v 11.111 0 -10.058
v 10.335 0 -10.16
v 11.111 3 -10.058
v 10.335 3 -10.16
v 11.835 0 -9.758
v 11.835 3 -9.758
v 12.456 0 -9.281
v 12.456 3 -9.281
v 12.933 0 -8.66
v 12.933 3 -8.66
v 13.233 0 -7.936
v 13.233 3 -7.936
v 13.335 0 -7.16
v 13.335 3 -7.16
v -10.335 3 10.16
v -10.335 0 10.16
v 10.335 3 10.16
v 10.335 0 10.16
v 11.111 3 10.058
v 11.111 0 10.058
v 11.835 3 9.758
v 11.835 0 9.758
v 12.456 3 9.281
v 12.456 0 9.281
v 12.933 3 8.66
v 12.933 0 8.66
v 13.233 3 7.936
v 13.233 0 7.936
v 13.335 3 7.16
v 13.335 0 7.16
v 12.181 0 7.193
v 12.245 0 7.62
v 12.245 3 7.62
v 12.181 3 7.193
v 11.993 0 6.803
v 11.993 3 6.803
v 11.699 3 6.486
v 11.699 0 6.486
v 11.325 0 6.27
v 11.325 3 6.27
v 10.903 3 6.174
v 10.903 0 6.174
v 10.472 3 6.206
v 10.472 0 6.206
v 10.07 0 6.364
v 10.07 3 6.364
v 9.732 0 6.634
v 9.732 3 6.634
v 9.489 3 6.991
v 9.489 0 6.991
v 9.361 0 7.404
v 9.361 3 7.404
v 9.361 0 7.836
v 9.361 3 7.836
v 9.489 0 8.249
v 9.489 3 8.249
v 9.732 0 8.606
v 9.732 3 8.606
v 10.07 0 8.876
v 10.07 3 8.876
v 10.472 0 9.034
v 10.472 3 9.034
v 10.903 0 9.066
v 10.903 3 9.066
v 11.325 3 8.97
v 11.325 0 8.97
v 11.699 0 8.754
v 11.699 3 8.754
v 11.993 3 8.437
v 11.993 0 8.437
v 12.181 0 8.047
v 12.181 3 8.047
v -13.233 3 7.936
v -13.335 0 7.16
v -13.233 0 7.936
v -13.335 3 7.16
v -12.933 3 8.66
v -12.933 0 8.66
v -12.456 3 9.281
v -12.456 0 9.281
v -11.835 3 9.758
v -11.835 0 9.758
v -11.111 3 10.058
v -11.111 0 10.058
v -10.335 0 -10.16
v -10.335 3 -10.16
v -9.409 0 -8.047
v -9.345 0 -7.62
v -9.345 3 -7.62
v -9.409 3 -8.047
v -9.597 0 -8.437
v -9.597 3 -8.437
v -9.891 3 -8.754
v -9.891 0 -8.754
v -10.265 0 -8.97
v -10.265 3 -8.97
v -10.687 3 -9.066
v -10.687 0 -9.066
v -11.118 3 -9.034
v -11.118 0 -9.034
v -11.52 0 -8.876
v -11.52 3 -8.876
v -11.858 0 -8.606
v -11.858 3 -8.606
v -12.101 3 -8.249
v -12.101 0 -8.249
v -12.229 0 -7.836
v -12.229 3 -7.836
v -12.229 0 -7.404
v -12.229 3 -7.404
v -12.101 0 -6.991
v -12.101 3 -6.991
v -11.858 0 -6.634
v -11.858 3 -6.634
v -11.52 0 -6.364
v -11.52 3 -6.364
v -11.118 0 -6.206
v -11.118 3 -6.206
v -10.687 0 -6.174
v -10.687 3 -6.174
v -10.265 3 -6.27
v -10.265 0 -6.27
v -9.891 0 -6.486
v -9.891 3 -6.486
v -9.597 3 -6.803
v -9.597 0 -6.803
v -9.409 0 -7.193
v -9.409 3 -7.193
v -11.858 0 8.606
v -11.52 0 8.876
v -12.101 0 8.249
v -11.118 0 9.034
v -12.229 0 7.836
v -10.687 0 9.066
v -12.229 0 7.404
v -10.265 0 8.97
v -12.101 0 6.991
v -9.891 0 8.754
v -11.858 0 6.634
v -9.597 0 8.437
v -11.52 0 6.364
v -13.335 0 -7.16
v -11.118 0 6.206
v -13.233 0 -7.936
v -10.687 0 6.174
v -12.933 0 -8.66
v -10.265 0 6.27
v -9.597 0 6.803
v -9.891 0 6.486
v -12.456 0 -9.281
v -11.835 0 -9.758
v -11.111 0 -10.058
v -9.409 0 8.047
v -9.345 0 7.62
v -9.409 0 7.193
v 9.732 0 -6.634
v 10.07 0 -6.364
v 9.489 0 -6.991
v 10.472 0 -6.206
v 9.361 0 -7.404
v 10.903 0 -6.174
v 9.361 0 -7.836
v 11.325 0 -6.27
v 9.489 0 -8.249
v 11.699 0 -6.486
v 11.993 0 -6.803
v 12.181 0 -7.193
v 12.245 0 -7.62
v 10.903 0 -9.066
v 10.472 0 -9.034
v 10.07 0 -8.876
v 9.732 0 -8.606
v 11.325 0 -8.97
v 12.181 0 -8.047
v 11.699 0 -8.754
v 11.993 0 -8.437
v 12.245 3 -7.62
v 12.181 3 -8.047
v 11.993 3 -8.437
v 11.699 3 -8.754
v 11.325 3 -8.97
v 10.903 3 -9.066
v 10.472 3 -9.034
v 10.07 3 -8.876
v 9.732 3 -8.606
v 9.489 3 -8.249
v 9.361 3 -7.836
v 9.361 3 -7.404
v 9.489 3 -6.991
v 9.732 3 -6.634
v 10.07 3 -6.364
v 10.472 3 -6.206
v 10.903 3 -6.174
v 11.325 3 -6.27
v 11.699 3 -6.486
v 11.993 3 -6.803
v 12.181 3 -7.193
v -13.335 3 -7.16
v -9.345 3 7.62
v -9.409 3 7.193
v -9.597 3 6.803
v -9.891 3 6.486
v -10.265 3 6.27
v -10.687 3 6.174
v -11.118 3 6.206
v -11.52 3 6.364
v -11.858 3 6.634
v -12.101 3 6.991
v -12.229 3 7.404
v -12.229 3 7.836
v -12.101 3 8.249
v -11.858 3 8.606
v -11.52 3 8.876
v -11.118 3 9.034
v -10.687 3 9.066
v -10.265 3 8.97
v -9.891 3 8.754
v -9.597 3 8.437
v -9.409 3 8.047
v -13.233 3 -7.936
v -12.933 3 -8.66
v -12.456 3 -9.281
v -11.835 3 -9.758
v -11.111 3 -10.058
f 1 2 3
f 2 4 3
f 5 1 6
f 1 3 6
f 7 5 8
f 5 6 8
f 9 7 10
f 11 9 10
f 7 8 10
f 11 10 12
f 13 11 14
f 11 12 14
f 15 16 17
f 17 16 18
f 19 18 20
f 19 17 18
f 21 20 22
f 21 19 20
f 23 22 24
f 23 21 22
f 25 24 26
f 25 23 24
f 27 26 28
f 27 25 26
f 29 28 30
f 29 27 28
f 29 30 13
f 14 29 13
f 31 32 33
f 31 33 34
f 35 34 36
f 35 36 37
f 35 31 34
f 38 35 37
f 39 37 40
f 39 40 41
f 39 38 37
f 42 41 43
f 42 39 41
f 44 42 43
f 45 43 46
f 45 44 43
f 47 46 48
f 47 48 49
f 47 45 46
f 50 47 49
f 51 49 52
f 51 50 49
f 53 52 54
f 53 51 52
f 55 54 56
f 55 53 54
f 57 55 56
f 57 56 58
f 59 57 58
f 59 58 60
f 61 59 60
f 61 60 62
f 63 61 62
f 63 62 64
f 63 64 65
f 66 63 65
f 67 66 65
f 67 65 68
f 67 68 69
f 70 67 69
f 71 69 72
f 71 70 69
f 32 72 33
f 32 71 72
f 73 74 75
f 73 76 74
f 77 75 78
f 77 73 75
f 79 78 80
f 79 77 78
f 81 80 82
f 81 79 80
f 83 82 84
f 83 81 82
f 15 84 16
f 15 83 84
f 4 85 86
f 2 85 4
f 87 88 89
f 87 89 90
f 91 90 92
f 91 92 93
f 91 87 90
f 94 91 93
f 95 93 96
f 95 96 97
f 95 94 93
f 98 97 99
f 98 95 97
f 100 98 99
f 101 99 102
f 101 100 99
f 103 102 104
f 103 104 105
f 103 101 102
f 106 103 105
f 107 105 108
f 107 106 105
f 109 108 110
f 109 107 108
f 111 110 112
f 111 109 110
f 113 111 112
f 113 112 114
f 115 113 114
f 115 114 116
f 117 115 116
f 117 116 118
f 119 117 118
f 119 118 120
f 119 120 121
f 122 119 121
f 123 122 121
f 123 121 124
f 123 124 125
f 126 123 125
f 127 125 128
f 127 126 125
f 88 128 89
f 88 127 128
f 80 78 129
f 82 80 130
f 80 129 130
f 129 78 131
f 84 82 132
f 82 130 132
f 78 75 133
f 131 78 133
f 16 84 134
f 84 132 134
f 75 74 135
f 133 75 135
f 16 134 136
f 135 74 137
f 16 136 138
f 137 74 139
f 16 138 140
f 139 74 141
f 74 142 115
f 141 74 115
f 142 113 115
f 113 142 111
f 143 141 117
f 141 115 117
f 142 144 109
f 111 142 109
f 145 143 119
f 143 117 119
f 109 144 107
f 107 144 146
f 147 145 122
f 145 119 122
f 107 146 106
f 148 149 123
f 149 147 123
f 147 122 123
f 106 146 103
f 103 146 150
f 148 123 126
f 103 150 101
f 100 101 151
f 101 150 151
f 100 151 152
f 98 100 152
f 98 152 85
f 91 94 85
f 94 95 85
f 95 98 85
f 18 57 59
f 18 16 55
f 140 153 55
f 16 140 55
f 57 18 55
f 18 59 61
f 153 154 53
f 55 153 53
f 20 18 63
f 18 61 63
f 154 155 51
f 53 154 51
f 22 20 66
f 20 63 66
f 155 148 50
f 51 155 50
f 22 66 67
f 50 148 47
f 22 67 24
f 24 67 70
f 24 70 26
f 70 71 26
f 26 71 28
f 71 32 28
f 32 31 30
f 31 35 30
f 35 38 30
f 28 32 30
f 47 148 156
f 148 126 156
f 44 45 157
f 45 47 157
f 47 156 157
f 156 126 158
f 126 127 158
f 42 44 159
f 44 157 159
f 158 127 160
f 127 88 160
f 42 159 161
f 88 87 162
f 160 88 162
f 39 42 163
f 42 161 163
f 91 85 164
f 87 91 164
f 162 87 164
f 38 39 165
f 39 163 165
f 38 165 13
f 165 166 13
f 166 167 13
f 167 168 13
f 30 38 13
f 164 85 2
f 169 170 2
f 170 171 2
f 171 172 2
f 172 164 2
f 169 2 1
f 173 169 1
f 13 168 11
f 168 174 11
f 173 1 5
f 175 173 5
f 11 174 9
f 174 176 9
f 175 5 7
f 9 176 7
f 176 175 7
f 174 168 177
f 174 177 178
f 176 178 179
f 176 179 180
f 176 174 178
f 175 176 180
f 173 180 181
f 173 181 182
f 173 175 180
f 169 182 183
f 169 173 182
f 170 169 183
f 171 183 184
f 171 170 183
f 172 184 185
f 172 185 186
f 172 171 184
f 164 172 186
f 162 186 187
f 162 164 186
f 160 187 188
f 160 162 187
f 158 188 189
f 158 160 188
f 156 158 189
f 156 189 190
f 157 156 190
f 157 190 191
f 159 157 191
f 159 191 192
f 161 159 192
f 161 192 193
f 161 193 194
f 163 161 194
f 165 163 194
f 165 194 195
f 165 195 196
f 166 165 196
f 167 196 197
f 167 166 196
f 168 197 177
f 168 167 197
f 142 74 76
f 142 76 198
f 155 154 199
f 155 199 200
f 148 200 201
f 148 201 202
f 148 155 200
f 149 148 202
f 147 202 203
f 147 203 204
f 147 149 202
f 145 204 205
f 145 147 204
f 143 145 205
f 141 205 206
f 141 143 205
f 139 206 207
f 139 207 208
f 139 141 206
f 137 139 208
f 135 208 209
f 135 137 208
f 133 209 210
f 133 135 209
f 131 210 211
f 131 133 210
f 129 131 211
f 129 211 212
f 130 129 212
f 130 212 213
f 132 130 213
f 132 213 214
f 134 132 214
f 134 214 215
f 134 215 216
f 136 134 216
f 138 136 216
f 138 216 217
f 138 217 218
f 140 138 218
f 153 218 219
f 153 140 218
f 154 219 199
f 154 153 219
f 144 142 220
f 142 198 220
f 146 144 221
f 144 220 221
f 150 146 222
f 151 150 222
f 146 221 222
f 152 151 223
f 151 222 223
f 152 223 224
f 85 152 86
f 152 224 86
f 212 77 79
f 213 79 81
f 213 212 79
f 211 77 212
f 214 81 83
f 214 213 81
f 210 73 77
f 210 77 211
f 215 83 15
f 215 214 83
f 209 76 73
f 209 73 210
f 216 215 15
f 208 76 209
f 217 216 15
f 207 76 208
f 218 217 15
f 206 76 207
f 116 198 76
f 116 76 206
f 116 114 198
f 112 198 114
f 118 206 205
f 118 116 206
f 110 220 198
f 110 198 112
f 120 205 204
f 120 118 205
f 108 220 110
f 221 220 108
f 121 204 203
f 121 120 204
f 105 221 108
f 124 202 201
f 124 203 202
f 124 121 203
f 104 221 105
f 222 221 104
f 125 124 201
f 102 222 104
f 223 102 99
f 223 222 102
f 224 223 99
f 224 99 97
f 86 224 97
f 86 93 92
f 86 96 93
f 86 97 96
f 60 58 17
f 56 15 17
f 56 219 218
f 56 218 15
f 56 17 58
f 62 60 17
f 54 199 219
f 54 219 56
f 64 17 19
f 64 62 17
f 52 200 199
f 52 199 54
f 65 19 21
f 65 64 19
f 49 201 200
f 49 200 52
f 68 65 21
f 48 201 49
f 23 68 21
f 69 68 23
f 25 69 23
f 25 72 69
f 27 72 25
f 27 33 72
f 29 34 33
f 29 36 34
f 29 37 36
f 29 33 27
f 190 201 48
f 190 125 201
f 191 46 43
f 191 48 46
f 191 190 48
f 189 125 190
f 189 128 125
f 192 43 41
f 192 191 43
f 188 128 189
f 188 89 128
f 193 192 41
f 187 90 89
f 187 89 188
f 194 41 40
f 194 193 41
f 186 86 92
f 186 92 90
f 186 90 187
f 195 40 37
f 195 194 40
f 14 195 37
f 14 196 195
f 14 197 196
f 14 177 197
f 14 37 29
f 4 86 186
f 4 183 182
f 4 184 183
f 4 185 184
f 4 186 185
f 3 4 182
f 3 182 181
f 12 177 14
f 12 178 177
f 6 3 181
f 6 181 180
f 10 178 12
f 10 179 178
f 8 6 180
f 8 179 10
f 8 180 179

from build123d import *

# Parameters (mm, degrees)
SKETCH1_W           = 26.67
SKETCH1_H           = 20.32
SKETCH1_R           = 1.45
BOSS_EXTRUDE1_DEPTH = 3
FILLET1_R           = 3


with BuildPart() as part:
    # Sketch1 → Boss-Extrude1 (new body)
    with BuildSketch(Plane(origin=(0, 0, 0), x_dir=(1, 0, 0), z_dir=(0, 1, 0))):
        Rectangle(SKETCH1_W, SKETCH1_H)
        with Locations((-10.795, 7.62)):
            Circle(SKETCH1_R, mode=Mode.SUBTRACT)
        with Locations((-10.795, -7.62)):
            Circle(SKETCH1_R, mode=Mode.SUBTRACT)
        with Locations((10.795, -7.62)):
            Circle(SKETCH1_R, mode=Mode.SUBTRACT)
        with Locations((10.795, 7.62)):
            Circle(SKETCH1_R, mode=Mode.SUBTRACT)
    extrude(amount=BOSS_EXTRUDE1_DEPTH)

    # Fillet1
    fillet1_edges = [part.edges().sort_by_distance(p)[0] for p in [
        (13.335, 1.5, 10.16),
        (-13.335, 1.5, 10.16),
        (-13.335, 1.5, -10.16),
        (13.335, 1.5, -10.16),
    ]]
    fillet(fillet1_edges, radius=FILLET1_R)


solid = part.part
